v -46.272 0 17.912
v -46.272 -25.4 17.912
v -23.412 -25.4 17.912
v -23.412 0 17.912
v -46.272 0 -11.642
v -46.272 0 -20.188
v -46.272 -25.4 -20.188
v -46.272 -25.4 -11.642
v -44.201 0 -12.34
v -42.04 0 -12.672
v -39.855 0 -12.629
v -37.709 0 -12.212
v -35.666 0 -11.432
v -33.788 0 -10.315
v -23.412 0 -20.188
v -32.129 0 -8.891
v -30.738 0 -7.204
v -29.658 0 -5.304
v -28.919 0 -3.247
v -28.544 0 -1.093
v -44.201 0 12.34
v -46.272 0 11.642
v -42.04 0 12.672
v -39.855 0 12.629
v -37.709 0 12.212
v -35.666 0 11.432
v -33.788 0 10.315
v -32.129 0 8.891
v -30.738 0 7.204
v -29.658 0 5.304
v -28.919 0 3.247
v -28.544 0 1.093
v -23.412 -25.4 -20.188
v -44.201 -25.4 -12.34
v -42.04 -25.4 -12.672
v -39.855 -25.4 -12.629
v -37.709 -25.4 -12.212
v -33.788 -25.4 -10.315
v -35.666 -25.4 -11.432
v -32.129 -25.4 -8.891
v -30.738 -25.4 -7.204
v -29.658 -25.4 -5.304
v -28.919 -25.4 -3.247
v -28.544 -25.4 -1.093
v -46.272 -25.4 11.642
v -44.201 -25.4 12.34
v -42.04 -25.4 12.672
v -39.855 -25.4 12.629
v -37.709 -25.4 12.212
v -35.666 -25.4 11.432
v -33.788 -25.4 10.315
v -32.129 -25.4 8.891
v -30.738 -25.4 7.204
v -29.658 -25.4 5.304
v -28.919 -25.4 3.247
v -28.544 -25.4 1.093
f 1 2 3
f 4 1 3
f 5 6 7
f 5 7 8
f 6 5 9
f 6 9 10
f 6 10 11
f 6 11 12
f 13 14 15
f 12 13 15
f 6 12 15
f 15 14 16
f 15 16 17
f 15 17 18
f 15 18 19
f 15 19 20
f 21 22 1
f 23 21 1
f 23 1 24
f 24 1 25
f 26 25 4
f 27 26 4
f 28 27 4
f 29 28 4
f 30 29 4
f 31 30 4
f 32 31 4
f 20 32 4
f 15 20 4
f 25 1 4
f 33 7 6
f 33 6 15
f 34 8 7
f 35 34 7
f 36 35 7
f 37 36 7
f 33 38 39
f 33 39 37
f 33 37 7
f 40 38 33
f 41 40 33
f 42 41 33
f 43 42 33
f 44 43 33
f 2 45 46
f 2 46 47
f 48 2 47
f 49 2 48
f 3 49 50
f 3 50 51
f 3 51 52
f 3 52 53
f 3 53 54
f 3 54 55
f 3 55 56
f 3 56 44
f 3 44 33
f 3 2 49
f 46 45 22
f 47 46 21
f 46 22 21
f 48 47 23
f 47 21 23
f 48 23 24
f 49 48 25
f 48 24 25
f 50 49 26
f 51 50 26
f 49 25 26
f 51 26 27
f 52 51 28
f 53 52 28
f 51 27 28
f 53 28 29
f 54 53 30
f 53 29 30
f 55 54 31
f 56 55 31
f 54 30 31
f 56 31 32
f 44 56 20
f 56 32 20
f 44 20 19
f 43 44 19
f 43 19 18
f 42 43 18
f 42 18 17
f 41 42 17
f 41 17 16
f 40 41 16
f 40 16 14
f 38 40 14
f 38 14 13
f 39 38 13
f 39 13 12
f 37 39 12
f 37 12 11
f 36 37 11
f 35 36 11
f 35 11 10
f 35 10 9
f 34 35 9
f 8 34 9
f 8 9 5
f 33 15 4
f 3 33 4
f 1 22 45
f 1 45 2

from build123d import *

# Parameters (mm, degrees)
F0_W     = 22.86
F0_H     = 38.1
F1_DEPTH = 25.4
F2_R     = 12.7
F3_DEPTH = 89
F5_DEPTH = 25.401


# Not quite as in the source:
# - an extrude ends at something that could not be found from the text; its depth is read off the source's solid


with BuildPart() as f1:
    # F0 (on Front) → F1 (new body)
    with BuildSketch(Plane.XZ):
        with Locations((-34.8423583888, -1.1378988595)):
            Rectangle(F0_W, F0_H)
    extrude(amount=F1_DEPTH)

    # F2 (on Front) → F3 (cut, through all)
    with BuildSketch(Plane.XZ):
        with Locations((-35.3627614677, 3.7935657892)):
            Circle(F2_R)
    extrude(amount=-F3_DEPTH, mode=Mode.SUBTRACT)

    # F4 (on face) → F5 (cut, through all)
    with BuildSketch(Plane(origin=(0, 0, 0), x_dir=(-1, 0, 0), z_dir=(0, 1, 0))):
        with BuildLine():
            ThreePointArc((46.2723583888, -11.6417417865), (51.8211548639, -6.9581684388), (53.8969423294, 0))
            ThreePointArc((53.8969423294, 0), (51.8211548639, 6.9581684388), (46.2723583888, 11.6417417865))
            Line((46.2723583888, 11.6417417865), (46.2723583888, -11.6417417865))
        make_face()
        with BuildLine():
            Line((46.2723583888, -11.6417417865), (46.2723583888, 11.6417417865))
            ThreePointArc((46.2723583888, 11.6417417865), (28.4969423294, 0), (46.2723583888, -11.6417417865))
        make_face()
    extrude(amount=-F5_DEPTH, mode=Mode.SUBTRACT)


solid = f1.part
